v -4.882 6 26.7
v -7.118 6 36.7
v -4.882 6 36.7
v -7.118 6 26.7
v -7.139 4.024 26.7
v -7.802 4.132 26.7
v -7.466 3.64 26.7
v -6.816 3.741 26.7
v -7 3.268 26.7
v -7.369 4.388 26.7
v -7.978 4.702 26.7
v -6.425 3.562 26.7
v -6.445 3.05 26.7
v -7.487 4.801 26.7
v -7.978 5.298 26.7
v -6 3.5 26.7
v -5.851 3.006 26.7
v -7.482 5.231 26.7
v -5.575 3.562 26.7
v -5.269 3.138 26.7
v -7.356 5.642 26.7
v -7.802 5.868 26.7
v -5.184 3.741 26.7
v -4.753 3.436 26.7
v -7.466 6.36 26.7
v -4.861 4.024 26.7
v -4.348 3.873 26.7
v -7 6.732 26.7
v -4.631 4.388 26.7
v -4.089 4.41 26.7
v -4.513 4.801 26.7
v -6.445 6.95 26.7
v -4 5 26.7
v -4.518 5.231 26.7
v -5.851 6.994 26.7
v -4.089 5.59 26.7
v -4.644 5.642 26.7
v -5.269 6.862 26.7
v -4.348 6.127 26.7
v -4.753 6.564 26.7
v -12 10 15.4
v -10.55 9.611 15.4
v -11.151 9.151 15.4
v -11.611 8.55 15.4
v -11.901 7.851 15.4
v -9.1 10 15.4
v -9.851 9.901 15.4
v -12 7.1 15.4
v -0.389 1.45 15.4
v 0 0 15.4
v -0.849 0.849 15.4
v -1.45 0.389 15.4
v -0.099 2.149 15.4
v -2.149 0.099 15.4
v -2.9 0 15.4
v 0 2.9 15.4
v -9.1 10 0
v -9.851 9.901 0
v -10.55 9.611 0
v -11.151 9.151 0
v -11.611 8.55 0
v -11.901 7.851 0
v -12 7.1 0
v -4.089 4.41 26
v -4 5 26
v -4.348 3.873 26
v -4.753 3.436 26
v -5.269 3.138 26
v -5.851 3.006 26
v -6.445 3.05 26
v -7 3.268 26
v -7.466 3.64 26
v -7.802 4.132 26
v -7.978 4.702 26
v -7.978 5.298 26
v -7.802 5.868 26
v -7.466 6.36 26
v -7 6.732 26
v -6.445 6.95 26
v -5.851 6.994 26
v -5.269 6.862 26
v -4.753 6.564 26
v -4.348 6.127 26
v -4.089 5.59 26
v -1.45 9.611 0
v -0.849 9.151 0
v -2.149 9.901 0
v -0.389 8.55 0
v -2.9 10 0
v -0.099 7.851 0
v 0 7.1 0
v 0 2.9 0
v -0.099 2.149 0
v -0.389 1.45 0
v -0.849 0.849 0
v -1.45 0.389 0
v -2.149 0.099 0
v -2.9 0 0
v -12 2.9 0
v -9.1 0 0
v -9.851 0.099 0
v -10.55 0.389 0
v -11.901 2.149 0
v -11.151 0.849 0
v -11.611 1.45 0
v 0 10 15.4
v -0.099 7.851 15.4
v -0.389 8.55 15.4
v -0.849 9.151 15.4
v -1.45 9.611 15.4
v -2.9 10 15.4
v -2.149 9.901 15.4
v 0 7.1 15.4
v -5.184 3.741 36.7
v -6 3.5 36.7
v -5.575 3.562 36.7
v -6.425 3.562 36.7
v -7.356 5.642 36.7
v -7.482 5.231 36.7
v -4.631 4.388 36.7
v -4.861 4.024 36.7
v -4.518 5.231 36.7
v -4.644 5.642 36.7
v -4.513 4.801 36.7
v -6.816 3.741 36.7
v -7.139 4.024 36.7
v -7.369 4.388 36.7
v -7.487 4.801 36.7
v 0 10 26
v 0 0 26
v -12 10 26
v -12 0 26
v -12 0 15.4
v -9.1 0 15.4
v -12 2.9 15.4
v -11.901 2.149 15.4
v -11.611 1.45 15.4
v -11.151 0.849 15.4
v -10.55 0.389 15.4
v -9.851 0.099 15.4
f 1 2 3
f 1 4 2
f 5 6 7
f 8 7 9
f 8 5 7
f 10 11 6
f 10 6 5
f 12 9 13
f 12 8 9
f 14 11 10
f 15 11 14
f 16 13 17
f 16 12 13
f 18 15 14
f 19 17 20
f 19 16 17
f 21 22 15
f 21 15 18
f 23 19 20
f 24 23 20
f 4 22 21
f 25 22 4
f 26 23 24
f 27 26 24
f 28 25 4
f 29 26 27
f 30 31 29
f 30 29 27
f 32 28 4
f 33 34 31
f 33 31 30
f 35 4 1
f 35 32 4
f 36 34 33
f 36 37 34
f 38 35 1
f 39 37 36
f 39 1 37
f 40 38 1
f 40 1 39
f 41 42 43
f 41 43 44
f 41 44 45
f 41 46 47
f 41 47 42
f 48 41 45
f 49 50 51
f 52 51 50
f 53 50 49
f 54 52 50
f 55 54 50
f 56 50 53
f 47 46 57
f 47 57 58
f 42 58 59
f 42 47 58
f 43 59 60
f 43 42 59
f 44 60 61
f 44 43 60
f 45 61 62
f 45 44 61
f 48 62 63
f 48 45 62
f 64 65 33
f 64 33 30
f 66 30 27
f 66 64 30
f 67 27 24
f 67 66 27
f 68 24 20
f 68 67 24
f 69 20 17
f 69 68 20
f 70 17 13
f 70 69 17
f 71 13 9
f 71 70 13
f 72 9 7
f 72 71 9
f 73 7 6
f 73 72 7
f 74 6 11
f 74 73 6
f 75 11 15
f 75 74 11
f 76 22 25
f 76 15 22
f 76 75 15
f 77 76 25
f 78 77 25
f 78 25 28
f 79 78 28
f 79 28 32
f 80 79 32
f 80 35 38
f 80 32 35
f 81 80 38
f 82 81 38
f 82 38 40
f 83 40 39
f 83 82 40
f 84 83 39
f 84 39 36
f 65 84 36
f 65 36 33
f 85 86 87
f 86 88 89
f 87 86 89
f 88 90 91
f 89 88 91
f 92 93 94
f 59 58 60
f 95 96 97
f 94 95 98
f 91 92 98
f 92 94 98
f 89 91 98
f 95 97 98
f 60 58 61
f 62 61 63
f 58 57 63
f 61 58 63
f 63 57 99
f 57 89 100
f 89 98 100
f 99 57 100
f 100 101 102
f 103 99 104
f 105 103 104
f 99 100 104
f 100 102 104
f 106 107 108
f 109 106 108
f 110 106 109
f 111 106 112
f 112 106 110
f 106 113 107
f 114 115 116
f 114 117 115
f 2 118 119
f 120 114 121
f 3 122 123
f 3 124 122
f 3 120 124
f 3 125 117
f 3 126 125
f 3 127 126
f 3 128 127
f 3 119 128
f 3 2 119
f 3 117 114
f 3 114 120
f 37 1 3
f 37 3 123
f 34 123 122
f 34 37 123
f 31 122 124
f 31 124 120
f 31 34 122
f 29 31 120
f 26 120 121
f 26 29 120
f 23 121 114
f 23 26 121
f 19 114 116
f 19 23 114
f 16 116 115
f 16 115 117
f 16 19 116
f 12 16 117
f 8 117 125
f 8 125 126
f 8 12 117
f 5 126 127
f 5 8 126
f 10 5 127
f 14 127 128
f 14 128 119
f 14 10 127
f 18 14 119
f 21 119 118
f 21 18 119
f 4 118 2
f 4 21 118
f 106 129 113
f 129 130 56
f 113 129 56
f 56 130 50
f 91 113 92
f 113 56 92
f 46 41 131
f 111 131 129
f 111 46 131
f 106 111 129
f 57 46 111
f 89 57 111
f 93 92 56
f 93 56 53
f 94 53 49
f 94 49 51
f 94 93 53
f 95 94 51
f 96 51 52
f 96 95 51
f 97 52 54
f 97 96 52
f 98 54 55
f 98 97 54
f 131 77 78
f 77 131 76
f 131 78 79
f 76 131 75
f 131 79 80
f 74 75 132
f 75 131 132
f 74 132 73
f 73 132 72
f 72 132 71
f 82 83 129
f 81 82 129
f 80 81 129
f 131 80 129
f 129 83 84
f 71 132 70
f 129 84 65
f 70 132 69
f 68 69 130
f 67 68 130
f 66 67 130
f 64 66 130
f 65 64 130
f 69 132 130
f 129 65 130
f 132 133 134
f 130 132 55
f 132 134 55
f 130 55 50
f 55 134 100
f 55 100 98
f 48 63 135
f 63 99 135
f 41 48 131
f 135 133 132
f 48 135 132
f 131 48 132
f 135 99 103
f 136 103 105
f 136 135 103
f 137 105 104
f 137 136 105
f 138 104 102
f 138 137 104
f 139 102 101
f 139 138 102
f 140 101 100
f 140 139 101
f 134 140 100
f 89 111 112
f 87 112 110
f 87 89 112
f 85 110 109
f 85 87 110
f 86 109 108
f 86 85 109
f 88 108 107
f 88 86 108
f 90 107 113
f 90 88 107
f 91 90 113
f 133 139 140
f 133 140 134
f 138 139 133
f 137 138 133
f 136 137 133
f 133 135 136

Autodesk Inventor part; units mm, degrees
ref_plane "YZ Plane" through (0, 0, 0) normal (1, 0, 0) x (0, 1, 0)
ref_plane "XZ Plane" through (0, 0, 0) normal (0, 1, 0) x (-1, 0, 0)
ref_plane "XY Plane" through (0, 0, 0) normal (0, 0, 1) x (1, 0, 0)
sketch "Szkic1" plane through (0, 0, 0) normal (0, 1, 0) x (-1, 0, 0)
  line L0 (0, 0) -> (12, 0)
  line L1 (12, 0) -> (12, 26)
  line L2 (12, 26) -> (0, 26)
  line L3 (0, 26) -> (0, 0)
  dimension "d0" = 26
  dimension "d1" = 12
extrude "Wyciągnięcie proste1" add sketch "Szkic1" along normal blind 10
fillet "Zaokrąglenie1" radius 2.9 4 edges at (0, 10, 13) (0, 0, 13) (-12, 10, 13) (-12, 0, 13)
sketch "Szkic2" plane through (-9.1, 0, 26) normal (0, 0, 1) x (1, 0, 0)
  circle A0 centre (3.1, 5) radius 2
  line L0 (-2.9, 2.9) -> (-2.9, 7.1) projected
  line L1 (0, 10) -> (6.2, 10) projected
  point P0 (9.1, 0)
  point P1 (-2.9, 5)
  point P2 (3.1, 10)
  dimension "d5" = 4
extrude "Wyciągnięcie proste2" add sketch "Szkic2" along normal blind 0.7
sketch "Szkic3" plane through (-6, 5, 26.7) normal (0, 0, 1) x (1, 0, 0)
  circle A0 centre (0, 0) radius 1.5
  line L0 (-1.118, 1) -> (1.118, 1)
  circle A1 centre (0, 0) radius 2 projected
  line L1 (-3.1, -5) -> (3.1, -5) projected
  point P0 (6, -5)
  dimension "d8" = 3
  dimension "d9" = 2.5
  dimension "d10" = 0
  dimension "d11" = 0
extrude "Wyciągnięcie proste3" add sketch "Szkic3" along normal blind 10 contours A0 L0 picked at (0.0594, 0.1702)
sketch "Szkic4" plane through (0, 10, 0) normal (0, 1, 0) x (1, 0, 0)
  line L0 (-9.1, -26) -> (-12, -26) projected
  line L1 (0, 0) -> (0, -26) projected
  line L2 (-12, -26) -> (0, -26)
  line L3 (0, -26) -> (0, -15.4)
  line L4 (0, -15.4) -> (-12, -15.4)
  line L5 (-12, -15.4) -> (-12, -26)
  line L6 (-2.9, 0) -> (-9.1, 0) projected
  dimension "d14" = 15.4
extrude "Wyciągnięcie proste4" add sketch "Szkic4" against normal blind 10
properties part number "Silniczek"
